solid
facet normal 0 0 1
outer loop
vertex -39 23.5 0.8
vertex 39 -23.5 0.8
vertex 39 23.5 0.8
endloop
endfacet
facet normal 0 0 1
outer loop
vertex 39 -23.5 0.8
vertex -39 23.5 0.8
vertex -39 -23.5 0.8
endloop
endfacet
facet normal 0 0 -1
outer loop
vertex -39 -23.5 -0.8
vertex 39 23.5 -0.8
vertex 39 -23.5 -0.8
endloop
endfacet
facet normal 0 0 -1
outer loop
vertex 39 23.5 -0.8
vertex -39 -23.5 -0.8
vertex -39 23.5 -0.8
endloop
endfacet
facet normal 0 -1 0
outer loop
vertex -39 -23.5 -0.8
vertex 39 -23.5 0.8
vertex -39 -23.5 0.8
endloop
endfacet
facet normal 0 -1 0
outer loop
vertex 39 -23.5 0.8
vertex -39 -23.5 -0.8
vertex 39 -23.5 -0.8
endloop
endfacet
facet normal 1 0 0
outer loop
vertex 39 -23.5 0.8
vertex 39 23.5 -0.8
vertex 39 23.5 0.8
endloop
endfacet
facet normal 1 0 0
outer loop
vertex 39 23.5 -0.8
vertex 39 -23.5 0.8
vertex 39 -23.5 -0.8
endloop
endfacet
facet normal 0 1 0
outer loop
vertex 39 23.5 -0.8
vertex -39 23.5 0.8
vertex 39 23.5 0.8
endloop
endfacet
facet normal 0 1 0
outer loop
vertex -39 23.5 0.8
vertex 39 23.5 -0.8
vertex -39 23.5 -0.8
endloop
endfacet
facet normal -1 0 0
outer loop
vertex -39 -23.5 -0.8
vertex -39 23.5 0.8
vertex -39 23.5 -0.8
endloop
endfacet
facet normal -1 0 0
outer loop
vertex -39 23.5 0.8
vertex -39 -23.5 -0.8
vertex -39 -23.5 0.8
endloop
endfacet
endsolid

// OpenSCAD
// Parameters
length = 78; //[39:156:0.5]
width = 47; //[23.5:94:0.5]
thickness = 1.6; //[0.8:3.2:0.1]
corner_radius = 0; //[0:10:0.5]

// PCB Plate - complete geometry
module pcb_plate() {
  color([0.0, 0.4, 0.2]) { // Green color for PCB
    cube([length, width, thickness], center=true);
  }
}

// Assembly
module assembly() {
  pcb_plate();
}

assembly();
